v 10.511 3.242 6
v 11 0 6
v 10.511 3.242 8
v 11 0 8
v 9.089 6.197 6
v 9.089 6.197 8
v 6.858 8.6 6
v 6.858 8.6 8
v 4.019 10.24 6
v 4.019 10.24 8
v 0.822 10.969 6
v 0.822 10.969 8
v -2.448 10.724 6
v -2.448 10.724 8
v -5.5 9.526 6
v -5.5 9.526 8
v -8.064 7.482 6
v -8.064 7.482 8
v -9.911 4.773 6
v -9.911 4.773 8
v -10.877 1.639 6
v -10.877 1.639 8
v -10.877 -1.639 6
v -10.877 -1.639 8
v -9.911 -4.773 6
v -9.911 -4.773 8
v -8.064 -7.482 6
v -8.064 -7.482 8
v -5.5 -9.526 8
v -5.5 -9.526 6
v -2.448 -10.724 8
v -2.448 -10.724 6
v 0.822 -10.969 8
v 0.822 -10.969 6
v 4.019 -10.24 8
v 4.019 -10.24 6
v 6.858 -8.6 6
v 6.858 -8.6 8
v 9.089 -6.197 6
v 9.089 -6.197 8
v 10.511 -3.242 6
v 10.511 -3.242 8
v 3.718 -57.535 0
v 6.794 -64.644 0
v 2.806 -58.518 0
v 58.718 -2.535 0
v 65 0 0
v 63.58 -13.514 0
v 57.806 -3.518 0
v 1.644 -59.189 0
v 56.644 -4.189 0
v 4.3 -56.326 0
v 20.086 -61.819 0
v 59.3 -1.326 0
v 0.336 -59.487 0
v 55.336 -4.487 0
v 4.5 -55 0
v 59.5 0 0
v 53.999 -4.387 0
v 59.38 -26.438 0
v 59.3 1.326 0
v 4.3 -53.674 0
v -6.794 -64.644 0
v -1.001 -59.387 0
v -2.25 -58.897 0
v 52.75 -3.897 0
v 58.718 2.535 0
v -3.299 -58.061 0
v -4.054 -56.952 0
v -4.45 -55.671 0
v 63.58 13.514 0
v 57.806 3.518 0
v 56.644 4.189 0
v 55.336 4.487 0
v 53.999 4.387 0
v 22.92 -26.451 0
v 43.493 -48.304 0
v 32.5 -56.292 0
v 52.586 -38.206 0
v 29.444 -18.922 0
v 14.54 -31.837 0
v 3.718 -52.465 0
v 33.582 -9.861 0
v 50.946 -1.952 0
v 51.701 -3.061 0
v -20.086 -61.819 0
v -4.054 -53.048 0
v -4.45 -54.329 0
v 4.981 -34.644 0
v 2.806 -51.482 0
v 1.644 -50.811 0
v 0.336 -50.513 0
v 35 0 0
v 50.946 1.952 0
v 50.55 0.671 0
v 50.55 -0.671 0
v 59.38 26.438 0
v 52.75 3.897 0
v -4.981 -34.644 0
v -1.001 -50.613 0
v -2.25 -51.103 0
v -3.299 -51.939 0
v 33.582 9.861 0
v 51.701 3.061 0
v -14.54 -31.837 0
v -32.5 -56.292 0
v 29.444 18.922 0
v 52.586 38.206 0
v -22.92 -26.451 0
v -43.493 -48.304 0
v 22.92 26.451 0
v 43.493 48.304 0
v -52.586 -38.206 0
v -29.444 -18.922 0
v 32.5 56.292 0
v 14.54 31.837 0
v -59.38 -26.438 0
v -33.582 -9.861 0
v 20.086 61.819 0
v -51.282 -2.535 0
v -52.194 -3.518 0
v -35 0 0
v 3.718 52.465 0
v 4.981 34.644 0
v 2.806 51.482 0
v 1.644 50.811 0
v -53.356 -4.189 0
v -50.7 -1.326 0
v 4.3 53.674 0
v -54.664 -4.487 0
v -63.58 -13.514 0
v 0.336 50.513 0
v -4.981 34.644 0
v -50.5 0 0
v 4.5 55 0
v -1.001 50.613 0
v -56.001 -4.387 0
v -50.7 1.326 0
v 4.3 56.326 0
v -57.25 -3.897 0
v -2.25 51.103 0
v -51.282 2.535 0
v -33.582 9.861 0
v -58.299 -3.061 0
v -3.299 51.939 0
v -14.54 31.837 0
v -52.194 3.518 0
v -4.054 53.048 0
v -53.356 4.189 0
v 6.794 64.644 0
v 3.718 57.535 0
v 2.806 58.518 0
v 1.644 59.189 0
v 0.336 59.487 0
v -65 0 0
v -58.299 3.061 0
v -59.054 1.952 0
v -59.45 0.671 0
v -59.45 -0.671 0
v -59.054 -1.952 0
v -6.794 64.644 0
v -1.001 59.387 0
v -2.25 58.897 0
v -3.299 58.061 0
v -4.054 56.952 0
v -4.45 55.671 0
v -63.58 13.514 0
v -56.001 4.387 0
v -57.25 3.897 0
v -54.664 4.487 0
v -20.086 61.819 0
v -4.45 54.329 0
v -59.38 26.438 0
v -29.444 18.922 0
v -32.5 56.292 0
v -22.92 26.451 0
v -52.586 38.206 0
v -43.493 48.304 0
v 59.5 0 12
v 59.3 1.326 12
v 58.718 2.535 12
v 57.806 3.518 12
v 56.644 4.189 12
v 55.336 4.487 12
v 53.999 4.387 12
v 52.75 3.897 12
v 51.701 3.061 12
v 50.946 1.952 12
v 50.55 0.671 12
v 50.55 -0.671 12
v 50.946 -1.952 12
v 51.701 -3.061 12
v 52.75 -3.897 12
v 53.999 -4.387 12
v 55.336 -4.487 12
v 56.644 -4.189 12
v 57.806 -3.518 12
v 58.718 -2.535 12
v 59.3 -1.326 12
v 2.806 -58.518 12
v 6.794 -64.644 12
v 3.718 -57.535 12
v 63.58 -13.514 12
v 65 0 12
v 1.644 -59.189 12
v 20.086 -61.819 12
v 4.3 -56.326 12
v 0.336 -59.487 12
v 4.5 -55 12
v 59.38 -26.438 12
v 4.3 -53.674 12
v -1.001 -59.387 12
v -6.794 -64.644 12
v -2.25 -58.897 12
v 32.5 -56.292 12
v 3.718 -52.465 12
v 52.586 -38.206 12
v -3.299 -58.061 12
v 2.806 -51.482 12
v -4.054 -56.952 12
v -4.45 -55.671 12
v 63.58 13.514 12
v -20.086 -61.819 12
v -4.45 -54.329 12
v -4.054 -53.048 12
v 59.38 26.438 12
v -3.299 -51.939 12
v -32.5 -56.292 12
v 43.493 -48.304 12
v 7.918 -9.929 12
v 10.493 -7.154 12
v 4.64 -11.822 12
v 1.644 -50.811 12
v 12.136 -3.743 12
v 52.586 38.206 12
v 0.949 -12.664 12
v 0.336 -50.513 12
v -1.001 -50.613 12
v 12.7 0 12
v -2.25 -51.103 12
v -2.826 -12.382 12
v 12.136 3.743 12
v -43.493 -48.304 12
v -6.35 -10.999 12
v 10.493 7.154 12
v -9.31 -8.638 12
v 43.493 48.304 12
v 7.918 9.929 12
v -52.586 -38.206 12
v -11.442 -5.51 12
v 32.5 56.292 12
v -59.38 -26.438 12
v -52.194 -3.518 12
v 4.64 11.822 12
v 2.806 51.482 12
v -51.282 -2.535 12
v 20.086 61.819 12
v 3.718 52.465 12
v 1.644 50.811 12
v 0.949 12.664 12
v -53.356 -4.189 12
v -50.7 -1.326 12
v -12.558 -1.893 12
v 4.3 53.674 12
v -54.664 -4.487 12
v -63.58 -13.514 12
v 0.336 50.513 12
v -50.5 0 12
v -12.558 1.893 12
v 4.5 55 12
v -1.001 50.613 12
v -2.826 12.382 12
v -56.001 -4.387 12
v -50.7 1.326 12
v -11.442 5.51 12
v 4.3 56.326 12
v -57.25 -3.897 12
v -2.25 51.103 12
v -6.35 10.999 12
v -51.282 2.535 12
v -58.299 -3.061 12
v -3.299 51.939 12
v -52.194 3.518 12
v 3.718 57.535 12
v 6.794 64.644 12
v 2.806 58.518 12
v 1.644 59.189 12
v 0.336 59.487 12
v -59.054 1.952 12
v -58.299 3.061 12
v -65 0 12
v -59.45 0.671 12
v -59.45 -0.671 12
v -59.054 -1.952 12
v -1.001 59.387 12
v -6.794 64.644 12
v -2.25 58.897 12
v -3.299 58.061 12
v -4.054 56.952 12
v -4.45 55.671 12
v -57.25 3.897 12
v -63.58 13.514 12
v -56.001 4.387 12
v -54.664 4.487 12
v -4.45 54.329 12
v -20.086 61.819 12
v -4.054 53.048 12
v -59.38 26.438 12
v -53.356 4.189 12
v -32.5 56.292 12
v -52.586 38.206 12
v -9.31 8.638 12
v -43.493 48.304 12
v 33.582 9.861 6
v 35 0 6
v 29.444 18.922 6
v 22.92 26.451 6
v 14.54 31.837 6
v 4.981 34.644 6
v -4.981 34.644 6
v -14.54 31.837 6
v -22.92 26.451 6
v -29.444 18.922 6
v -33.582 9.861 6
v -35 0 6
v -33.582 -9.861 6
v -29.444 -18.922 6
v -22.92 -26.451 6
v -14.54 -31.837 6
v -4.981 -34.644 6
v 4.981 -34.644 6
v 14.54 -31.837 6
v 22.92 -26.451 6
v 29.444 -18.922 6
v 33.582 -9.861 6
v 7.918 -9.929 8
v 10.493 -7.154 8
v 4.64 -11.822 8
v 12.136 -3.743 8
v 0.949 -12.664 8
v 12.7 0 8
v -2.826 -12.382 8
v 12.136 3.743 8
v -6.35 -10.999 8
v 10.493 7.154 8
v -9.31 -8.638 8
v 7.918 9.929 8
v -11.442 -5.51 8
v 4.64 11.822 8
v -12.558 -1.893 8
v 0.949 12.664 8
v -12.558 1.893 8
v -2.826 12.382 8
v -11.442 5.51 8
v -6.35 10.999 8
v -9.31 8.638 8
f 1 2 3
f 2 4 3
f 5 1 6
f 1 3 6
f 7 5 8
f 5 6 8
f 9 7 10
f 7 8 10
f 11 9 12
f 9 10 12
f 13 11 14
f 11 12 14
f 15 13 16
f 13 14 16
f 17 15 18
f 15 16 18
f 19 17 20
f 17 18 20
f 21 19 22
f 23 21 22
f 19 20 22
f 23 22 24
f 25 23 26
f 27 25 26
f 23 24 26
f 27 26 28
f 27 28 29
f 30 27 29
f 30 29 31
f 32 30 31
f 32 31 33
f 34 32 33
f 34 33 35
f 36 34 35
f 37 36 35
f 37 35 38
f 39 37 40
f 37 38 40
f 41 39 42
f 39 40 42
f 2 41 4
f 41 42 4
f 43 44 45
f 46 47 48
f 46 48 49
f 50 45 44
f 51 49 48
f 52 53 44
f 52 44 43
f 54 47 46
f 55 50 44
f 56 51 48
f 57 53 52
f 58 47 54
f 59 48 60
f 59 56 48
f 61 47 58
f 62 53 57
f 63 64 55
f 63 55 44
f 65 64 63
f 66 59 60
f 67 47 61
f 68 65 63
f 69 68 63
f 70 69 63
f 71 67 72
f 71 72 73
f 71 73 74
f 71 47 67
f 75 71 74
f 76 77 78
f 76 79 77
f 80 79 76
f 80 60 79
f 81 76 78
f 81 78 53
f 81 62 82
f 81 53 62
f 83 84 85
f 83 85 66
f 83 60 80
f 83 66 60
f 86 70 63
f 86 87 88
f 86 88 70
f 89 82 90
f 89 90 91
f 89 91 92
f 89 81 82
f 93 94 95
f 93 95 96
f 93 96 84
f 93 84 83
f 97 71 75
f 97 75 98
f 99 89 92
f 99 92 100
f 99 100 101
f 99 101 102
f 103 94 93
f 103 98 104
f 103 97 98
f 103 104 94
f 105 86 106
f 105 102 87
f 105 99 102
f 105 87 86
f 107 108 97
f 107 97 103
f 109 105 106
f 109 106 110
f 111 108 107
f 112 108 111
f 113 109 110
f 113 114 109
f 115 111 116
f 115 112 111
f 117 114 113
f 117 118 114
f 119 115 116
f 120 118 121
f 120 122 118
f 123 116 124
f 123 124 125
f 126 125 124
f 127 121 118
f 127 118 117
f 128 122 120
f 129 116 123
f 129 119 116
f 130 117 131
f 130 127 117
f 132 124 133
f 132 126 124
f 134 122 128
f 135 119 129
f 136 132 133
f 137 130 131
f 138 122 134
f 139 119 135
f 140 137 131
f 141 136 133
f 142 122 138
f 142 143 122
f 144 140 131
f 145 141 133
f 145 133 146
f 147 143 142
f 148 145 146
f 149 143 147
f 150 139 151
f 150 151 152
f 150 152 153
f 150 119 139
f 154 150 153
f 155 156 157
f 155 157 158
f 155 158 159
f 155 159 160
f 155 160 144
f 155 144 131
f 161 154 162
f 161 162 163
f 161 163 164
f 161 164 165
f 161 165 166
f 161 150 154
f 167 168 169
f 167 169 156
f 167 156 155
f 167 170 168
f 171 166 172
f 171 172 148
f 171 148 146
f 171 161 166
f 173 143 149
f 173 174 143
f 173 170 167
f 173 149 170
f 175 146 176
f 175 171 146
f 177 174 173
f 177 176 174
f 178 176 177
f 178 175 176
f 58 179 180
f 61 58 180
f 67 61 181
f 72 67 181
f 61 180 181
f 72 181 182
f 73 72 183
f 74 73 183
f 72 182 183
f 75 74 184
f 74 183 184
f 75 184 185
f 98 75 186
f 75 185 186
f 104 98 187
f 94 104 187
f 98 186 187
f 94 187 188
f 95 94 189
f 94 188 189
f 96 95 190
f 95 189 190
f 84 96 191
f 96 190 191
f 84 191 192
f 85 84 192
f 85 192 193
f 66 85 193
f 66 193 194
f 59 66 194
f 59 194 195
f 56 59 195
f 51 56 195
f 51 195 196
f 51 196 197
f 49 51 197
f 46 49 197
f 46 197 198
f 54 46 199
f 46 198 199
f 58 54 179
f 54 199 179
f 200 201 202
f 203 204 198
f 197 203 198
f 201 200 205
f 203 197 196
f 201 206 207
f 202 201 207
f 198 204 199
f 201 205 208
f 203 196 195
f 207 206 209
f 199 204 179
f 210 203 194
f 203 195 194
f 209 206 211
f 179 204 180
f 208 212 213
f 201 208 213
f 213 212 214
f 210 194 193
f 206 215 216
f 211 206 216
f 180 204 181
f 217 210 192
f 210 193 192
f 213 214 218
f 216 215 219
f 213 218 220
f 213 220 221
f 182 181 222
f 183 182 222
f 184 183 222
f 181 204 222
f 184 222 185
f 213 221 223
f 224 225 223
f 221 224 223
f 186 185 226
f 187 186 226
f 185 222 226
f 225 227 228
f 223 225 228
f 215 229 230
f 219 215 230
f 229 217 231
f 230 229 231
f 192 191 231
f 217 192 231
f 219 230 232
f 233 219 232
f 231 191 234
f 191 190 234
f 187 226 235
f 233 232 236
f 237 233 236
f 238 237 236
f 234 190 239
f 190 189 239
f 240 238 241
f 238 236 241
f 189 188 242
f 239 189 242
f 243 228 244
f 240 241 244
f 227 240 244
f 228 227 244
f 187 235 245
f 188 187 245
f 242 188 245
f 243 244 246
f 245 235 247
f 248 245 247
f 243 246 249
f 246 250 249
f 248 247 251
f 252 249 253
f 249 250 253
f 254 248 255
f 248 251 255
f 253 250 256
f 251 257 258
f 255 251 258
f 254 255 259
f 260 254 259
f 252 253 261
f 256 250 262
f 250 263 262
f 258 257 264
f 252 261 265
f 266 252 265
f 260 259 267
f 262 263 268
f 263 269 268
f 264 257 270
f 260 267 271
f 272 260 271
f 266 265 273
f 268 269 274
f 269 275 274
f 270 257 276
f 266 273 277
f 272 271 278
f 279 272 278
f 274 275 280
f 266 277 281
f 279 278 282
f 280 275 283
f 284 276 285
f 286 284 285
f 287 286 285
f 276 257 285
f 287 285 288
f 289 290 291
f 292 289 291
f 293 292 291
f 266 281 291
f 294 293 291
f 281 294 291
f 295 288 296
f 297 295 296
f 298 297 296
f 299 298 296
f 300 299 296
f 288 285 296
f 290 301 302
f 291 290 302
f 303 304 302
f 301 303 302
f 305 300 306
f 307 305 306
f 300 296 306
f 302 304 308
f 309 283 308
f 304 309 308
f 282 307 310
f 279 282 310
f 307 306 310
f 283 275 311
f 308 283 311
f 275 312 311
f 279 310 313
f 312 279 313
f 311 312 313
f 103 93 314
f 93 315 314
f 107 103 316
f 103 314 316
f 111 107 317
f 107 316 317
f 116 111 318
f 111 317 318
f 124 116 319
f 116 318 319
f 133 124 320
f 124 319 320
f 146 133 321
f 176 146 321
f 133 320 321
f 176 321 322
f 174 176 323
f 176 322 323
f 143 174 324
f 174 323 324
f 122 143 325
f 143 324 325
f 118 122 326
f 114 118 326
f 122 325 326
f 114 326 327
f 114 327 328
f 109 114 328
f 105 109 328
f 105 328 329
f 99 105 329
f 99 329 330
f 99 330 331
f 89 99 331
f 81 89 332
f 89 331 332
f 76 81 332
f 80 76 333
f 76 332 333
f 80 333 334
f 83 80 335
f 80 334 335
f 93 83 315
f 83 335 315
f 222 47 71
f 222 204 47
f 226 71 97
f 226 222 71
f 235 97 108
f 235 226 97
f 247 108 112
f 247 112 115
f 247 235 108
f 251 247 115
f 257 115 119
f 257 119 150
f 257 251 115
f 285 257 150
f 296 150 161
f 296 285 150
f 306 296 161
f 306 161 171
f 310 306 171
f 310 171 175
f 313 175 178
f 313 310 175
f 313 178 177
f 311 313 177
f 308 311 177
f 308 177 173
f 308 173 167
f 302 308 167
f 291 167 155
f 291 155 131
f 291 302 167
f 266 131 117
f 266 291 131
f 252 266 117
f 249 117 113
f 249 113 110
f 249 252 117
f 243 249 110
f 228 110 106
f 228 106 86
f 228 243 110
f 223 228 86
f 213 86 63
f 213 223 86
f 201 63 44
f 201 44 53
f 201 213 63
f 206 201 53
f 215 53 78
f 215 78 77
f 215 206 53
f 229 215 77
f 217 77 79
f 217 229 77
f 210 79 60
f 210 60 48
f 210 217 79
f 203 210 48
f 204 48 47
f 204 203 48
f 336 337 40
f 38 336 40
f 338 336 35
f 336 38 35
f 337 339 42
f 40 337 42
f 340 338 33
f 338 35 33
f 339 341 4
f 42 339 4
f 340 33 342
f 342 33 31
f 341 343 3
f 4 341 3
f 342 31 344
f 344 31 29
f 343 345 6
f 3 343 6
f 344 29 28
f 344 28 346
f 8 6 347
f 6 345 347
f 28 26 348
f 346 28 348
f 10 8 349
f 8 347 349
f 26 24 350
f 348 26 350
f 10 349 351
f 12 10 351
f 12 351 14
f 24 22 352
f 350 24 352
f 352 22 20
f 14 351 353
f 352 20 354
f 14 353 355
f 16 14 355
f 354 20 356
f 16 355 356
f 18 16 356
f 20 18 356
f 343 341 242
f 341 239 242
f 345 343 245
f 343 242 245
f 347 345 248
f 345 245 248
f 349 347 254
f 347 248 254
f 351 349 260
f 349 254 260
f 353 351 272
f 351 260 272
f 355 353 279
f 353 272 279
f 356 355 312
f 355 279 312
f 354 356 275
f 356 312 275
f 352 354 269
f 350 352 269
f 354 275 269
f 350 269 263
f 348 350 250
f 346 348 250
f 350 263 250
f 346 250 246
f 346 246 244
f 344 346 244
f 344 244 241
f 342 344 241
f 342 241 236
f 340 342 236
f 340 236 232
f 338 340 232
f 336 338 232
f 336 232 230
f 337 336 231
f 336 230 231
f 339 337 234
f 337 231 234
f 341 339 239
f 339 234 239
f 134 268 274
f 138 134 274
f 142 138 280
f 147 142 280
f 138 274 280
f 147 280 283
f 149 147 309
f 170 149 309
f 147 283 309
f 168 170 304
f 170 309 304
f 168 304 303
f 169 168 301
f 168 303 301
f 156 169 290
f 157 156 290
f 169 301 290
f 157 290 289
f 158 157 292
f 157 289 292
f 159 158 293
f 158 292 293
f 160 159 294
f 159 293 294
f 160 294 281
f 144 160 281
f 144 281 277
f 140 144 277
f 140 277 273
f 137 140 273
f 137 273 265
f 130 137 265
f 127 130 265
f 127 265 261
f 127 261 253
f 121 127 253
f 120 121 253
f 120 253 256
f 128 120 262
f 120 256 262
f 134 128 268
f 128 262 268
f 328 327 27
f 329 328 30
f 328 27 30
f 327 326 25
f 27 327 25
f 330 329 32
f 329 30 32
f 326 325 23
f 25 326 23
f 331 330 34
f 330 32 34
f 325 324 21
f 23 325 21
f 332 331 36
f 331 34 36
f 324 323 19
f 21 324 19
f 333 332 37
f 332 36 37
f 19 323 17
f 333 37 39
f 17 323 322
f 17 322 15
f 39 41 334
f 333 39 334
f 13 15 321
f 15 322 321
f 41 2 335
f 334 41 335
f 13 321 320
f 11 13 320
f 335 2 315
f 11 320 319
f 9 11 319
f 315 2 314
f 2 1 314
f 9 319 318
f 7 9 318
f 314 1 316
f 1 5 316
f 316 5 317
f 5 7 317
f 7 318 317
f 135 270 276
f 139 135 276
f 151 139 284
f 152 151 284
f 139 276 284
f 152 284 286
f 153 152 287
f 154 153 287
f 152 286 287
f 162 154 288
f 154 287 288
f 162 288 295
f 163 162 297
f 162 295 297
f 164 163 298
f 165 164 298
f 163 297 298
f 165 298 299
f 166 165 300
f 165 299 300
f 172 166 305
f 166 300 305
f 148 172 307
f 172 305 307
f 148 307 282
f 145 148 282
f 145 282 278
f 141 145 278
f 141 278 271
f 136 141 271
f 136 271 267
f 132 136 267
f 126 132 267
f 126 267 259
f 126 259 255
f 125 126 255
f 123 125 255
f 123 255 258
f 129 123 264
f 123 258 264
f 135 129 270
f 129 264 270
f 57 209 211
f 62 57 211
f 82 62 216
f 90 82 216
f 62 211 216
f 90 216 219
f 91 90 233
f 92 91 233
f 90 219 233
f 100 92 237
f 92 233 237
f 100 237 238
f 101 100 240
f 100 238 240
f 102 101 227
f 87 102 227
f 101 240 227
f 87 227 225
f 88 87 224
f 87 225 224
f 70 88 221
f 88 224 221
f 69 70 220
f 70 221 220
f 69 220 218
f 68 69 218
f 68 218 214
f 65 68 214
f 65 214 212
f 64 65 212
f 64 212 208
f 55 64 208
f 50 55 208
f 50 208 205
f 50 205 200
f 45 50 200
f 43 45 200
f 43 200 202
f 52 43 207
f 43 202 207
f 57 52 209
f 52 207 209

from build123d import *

# Parameters (mm, degrees)
F0_W     = 65
F0_H     = 12
F4_R     = 4.5
F5_DEPTH = 12


with BuildPart() as f1:
    # F0 (on Front) → F1 (revolve)
    with BuildSketch(Plane.XZ):
        with Locations((32.5, 6)):
            Rectangle(F0_W, F0_H)
    revolve(axis=Axis((0, 0, 18.457142), (0, 0, 1)))

    # F2 (on Front) → F3 (revolve, cut)
    with BuildSketch(Plane.XZ):
        Polygon((0, 12), (0, 0), (35, 0), (35, 6), (11, 6), (11, 8), (12.7, 8), (12.7, 12), align=None)
    revolve(axis=Axis((0, 0, 11.269168), (0, 0, 1)), mode=Mode.SUBTRACT)

    # F4 (on face) → F5 (cut, through all)
    with BuildSketch(Plane.XY.offset(12)):
        with Locations((55, 0)):
            Circle(F4_R)
        with Locations((0, 55)):
            Circle(F4_R)
        with Locations((-55, 0)):
            Circle(F4_R)
        with Locations((0, -55)):
            Circle(F4_R)
    extrude(amount=-F5_DEPTH, mode=Mode.SUBTRACT)


solid = f1.part
